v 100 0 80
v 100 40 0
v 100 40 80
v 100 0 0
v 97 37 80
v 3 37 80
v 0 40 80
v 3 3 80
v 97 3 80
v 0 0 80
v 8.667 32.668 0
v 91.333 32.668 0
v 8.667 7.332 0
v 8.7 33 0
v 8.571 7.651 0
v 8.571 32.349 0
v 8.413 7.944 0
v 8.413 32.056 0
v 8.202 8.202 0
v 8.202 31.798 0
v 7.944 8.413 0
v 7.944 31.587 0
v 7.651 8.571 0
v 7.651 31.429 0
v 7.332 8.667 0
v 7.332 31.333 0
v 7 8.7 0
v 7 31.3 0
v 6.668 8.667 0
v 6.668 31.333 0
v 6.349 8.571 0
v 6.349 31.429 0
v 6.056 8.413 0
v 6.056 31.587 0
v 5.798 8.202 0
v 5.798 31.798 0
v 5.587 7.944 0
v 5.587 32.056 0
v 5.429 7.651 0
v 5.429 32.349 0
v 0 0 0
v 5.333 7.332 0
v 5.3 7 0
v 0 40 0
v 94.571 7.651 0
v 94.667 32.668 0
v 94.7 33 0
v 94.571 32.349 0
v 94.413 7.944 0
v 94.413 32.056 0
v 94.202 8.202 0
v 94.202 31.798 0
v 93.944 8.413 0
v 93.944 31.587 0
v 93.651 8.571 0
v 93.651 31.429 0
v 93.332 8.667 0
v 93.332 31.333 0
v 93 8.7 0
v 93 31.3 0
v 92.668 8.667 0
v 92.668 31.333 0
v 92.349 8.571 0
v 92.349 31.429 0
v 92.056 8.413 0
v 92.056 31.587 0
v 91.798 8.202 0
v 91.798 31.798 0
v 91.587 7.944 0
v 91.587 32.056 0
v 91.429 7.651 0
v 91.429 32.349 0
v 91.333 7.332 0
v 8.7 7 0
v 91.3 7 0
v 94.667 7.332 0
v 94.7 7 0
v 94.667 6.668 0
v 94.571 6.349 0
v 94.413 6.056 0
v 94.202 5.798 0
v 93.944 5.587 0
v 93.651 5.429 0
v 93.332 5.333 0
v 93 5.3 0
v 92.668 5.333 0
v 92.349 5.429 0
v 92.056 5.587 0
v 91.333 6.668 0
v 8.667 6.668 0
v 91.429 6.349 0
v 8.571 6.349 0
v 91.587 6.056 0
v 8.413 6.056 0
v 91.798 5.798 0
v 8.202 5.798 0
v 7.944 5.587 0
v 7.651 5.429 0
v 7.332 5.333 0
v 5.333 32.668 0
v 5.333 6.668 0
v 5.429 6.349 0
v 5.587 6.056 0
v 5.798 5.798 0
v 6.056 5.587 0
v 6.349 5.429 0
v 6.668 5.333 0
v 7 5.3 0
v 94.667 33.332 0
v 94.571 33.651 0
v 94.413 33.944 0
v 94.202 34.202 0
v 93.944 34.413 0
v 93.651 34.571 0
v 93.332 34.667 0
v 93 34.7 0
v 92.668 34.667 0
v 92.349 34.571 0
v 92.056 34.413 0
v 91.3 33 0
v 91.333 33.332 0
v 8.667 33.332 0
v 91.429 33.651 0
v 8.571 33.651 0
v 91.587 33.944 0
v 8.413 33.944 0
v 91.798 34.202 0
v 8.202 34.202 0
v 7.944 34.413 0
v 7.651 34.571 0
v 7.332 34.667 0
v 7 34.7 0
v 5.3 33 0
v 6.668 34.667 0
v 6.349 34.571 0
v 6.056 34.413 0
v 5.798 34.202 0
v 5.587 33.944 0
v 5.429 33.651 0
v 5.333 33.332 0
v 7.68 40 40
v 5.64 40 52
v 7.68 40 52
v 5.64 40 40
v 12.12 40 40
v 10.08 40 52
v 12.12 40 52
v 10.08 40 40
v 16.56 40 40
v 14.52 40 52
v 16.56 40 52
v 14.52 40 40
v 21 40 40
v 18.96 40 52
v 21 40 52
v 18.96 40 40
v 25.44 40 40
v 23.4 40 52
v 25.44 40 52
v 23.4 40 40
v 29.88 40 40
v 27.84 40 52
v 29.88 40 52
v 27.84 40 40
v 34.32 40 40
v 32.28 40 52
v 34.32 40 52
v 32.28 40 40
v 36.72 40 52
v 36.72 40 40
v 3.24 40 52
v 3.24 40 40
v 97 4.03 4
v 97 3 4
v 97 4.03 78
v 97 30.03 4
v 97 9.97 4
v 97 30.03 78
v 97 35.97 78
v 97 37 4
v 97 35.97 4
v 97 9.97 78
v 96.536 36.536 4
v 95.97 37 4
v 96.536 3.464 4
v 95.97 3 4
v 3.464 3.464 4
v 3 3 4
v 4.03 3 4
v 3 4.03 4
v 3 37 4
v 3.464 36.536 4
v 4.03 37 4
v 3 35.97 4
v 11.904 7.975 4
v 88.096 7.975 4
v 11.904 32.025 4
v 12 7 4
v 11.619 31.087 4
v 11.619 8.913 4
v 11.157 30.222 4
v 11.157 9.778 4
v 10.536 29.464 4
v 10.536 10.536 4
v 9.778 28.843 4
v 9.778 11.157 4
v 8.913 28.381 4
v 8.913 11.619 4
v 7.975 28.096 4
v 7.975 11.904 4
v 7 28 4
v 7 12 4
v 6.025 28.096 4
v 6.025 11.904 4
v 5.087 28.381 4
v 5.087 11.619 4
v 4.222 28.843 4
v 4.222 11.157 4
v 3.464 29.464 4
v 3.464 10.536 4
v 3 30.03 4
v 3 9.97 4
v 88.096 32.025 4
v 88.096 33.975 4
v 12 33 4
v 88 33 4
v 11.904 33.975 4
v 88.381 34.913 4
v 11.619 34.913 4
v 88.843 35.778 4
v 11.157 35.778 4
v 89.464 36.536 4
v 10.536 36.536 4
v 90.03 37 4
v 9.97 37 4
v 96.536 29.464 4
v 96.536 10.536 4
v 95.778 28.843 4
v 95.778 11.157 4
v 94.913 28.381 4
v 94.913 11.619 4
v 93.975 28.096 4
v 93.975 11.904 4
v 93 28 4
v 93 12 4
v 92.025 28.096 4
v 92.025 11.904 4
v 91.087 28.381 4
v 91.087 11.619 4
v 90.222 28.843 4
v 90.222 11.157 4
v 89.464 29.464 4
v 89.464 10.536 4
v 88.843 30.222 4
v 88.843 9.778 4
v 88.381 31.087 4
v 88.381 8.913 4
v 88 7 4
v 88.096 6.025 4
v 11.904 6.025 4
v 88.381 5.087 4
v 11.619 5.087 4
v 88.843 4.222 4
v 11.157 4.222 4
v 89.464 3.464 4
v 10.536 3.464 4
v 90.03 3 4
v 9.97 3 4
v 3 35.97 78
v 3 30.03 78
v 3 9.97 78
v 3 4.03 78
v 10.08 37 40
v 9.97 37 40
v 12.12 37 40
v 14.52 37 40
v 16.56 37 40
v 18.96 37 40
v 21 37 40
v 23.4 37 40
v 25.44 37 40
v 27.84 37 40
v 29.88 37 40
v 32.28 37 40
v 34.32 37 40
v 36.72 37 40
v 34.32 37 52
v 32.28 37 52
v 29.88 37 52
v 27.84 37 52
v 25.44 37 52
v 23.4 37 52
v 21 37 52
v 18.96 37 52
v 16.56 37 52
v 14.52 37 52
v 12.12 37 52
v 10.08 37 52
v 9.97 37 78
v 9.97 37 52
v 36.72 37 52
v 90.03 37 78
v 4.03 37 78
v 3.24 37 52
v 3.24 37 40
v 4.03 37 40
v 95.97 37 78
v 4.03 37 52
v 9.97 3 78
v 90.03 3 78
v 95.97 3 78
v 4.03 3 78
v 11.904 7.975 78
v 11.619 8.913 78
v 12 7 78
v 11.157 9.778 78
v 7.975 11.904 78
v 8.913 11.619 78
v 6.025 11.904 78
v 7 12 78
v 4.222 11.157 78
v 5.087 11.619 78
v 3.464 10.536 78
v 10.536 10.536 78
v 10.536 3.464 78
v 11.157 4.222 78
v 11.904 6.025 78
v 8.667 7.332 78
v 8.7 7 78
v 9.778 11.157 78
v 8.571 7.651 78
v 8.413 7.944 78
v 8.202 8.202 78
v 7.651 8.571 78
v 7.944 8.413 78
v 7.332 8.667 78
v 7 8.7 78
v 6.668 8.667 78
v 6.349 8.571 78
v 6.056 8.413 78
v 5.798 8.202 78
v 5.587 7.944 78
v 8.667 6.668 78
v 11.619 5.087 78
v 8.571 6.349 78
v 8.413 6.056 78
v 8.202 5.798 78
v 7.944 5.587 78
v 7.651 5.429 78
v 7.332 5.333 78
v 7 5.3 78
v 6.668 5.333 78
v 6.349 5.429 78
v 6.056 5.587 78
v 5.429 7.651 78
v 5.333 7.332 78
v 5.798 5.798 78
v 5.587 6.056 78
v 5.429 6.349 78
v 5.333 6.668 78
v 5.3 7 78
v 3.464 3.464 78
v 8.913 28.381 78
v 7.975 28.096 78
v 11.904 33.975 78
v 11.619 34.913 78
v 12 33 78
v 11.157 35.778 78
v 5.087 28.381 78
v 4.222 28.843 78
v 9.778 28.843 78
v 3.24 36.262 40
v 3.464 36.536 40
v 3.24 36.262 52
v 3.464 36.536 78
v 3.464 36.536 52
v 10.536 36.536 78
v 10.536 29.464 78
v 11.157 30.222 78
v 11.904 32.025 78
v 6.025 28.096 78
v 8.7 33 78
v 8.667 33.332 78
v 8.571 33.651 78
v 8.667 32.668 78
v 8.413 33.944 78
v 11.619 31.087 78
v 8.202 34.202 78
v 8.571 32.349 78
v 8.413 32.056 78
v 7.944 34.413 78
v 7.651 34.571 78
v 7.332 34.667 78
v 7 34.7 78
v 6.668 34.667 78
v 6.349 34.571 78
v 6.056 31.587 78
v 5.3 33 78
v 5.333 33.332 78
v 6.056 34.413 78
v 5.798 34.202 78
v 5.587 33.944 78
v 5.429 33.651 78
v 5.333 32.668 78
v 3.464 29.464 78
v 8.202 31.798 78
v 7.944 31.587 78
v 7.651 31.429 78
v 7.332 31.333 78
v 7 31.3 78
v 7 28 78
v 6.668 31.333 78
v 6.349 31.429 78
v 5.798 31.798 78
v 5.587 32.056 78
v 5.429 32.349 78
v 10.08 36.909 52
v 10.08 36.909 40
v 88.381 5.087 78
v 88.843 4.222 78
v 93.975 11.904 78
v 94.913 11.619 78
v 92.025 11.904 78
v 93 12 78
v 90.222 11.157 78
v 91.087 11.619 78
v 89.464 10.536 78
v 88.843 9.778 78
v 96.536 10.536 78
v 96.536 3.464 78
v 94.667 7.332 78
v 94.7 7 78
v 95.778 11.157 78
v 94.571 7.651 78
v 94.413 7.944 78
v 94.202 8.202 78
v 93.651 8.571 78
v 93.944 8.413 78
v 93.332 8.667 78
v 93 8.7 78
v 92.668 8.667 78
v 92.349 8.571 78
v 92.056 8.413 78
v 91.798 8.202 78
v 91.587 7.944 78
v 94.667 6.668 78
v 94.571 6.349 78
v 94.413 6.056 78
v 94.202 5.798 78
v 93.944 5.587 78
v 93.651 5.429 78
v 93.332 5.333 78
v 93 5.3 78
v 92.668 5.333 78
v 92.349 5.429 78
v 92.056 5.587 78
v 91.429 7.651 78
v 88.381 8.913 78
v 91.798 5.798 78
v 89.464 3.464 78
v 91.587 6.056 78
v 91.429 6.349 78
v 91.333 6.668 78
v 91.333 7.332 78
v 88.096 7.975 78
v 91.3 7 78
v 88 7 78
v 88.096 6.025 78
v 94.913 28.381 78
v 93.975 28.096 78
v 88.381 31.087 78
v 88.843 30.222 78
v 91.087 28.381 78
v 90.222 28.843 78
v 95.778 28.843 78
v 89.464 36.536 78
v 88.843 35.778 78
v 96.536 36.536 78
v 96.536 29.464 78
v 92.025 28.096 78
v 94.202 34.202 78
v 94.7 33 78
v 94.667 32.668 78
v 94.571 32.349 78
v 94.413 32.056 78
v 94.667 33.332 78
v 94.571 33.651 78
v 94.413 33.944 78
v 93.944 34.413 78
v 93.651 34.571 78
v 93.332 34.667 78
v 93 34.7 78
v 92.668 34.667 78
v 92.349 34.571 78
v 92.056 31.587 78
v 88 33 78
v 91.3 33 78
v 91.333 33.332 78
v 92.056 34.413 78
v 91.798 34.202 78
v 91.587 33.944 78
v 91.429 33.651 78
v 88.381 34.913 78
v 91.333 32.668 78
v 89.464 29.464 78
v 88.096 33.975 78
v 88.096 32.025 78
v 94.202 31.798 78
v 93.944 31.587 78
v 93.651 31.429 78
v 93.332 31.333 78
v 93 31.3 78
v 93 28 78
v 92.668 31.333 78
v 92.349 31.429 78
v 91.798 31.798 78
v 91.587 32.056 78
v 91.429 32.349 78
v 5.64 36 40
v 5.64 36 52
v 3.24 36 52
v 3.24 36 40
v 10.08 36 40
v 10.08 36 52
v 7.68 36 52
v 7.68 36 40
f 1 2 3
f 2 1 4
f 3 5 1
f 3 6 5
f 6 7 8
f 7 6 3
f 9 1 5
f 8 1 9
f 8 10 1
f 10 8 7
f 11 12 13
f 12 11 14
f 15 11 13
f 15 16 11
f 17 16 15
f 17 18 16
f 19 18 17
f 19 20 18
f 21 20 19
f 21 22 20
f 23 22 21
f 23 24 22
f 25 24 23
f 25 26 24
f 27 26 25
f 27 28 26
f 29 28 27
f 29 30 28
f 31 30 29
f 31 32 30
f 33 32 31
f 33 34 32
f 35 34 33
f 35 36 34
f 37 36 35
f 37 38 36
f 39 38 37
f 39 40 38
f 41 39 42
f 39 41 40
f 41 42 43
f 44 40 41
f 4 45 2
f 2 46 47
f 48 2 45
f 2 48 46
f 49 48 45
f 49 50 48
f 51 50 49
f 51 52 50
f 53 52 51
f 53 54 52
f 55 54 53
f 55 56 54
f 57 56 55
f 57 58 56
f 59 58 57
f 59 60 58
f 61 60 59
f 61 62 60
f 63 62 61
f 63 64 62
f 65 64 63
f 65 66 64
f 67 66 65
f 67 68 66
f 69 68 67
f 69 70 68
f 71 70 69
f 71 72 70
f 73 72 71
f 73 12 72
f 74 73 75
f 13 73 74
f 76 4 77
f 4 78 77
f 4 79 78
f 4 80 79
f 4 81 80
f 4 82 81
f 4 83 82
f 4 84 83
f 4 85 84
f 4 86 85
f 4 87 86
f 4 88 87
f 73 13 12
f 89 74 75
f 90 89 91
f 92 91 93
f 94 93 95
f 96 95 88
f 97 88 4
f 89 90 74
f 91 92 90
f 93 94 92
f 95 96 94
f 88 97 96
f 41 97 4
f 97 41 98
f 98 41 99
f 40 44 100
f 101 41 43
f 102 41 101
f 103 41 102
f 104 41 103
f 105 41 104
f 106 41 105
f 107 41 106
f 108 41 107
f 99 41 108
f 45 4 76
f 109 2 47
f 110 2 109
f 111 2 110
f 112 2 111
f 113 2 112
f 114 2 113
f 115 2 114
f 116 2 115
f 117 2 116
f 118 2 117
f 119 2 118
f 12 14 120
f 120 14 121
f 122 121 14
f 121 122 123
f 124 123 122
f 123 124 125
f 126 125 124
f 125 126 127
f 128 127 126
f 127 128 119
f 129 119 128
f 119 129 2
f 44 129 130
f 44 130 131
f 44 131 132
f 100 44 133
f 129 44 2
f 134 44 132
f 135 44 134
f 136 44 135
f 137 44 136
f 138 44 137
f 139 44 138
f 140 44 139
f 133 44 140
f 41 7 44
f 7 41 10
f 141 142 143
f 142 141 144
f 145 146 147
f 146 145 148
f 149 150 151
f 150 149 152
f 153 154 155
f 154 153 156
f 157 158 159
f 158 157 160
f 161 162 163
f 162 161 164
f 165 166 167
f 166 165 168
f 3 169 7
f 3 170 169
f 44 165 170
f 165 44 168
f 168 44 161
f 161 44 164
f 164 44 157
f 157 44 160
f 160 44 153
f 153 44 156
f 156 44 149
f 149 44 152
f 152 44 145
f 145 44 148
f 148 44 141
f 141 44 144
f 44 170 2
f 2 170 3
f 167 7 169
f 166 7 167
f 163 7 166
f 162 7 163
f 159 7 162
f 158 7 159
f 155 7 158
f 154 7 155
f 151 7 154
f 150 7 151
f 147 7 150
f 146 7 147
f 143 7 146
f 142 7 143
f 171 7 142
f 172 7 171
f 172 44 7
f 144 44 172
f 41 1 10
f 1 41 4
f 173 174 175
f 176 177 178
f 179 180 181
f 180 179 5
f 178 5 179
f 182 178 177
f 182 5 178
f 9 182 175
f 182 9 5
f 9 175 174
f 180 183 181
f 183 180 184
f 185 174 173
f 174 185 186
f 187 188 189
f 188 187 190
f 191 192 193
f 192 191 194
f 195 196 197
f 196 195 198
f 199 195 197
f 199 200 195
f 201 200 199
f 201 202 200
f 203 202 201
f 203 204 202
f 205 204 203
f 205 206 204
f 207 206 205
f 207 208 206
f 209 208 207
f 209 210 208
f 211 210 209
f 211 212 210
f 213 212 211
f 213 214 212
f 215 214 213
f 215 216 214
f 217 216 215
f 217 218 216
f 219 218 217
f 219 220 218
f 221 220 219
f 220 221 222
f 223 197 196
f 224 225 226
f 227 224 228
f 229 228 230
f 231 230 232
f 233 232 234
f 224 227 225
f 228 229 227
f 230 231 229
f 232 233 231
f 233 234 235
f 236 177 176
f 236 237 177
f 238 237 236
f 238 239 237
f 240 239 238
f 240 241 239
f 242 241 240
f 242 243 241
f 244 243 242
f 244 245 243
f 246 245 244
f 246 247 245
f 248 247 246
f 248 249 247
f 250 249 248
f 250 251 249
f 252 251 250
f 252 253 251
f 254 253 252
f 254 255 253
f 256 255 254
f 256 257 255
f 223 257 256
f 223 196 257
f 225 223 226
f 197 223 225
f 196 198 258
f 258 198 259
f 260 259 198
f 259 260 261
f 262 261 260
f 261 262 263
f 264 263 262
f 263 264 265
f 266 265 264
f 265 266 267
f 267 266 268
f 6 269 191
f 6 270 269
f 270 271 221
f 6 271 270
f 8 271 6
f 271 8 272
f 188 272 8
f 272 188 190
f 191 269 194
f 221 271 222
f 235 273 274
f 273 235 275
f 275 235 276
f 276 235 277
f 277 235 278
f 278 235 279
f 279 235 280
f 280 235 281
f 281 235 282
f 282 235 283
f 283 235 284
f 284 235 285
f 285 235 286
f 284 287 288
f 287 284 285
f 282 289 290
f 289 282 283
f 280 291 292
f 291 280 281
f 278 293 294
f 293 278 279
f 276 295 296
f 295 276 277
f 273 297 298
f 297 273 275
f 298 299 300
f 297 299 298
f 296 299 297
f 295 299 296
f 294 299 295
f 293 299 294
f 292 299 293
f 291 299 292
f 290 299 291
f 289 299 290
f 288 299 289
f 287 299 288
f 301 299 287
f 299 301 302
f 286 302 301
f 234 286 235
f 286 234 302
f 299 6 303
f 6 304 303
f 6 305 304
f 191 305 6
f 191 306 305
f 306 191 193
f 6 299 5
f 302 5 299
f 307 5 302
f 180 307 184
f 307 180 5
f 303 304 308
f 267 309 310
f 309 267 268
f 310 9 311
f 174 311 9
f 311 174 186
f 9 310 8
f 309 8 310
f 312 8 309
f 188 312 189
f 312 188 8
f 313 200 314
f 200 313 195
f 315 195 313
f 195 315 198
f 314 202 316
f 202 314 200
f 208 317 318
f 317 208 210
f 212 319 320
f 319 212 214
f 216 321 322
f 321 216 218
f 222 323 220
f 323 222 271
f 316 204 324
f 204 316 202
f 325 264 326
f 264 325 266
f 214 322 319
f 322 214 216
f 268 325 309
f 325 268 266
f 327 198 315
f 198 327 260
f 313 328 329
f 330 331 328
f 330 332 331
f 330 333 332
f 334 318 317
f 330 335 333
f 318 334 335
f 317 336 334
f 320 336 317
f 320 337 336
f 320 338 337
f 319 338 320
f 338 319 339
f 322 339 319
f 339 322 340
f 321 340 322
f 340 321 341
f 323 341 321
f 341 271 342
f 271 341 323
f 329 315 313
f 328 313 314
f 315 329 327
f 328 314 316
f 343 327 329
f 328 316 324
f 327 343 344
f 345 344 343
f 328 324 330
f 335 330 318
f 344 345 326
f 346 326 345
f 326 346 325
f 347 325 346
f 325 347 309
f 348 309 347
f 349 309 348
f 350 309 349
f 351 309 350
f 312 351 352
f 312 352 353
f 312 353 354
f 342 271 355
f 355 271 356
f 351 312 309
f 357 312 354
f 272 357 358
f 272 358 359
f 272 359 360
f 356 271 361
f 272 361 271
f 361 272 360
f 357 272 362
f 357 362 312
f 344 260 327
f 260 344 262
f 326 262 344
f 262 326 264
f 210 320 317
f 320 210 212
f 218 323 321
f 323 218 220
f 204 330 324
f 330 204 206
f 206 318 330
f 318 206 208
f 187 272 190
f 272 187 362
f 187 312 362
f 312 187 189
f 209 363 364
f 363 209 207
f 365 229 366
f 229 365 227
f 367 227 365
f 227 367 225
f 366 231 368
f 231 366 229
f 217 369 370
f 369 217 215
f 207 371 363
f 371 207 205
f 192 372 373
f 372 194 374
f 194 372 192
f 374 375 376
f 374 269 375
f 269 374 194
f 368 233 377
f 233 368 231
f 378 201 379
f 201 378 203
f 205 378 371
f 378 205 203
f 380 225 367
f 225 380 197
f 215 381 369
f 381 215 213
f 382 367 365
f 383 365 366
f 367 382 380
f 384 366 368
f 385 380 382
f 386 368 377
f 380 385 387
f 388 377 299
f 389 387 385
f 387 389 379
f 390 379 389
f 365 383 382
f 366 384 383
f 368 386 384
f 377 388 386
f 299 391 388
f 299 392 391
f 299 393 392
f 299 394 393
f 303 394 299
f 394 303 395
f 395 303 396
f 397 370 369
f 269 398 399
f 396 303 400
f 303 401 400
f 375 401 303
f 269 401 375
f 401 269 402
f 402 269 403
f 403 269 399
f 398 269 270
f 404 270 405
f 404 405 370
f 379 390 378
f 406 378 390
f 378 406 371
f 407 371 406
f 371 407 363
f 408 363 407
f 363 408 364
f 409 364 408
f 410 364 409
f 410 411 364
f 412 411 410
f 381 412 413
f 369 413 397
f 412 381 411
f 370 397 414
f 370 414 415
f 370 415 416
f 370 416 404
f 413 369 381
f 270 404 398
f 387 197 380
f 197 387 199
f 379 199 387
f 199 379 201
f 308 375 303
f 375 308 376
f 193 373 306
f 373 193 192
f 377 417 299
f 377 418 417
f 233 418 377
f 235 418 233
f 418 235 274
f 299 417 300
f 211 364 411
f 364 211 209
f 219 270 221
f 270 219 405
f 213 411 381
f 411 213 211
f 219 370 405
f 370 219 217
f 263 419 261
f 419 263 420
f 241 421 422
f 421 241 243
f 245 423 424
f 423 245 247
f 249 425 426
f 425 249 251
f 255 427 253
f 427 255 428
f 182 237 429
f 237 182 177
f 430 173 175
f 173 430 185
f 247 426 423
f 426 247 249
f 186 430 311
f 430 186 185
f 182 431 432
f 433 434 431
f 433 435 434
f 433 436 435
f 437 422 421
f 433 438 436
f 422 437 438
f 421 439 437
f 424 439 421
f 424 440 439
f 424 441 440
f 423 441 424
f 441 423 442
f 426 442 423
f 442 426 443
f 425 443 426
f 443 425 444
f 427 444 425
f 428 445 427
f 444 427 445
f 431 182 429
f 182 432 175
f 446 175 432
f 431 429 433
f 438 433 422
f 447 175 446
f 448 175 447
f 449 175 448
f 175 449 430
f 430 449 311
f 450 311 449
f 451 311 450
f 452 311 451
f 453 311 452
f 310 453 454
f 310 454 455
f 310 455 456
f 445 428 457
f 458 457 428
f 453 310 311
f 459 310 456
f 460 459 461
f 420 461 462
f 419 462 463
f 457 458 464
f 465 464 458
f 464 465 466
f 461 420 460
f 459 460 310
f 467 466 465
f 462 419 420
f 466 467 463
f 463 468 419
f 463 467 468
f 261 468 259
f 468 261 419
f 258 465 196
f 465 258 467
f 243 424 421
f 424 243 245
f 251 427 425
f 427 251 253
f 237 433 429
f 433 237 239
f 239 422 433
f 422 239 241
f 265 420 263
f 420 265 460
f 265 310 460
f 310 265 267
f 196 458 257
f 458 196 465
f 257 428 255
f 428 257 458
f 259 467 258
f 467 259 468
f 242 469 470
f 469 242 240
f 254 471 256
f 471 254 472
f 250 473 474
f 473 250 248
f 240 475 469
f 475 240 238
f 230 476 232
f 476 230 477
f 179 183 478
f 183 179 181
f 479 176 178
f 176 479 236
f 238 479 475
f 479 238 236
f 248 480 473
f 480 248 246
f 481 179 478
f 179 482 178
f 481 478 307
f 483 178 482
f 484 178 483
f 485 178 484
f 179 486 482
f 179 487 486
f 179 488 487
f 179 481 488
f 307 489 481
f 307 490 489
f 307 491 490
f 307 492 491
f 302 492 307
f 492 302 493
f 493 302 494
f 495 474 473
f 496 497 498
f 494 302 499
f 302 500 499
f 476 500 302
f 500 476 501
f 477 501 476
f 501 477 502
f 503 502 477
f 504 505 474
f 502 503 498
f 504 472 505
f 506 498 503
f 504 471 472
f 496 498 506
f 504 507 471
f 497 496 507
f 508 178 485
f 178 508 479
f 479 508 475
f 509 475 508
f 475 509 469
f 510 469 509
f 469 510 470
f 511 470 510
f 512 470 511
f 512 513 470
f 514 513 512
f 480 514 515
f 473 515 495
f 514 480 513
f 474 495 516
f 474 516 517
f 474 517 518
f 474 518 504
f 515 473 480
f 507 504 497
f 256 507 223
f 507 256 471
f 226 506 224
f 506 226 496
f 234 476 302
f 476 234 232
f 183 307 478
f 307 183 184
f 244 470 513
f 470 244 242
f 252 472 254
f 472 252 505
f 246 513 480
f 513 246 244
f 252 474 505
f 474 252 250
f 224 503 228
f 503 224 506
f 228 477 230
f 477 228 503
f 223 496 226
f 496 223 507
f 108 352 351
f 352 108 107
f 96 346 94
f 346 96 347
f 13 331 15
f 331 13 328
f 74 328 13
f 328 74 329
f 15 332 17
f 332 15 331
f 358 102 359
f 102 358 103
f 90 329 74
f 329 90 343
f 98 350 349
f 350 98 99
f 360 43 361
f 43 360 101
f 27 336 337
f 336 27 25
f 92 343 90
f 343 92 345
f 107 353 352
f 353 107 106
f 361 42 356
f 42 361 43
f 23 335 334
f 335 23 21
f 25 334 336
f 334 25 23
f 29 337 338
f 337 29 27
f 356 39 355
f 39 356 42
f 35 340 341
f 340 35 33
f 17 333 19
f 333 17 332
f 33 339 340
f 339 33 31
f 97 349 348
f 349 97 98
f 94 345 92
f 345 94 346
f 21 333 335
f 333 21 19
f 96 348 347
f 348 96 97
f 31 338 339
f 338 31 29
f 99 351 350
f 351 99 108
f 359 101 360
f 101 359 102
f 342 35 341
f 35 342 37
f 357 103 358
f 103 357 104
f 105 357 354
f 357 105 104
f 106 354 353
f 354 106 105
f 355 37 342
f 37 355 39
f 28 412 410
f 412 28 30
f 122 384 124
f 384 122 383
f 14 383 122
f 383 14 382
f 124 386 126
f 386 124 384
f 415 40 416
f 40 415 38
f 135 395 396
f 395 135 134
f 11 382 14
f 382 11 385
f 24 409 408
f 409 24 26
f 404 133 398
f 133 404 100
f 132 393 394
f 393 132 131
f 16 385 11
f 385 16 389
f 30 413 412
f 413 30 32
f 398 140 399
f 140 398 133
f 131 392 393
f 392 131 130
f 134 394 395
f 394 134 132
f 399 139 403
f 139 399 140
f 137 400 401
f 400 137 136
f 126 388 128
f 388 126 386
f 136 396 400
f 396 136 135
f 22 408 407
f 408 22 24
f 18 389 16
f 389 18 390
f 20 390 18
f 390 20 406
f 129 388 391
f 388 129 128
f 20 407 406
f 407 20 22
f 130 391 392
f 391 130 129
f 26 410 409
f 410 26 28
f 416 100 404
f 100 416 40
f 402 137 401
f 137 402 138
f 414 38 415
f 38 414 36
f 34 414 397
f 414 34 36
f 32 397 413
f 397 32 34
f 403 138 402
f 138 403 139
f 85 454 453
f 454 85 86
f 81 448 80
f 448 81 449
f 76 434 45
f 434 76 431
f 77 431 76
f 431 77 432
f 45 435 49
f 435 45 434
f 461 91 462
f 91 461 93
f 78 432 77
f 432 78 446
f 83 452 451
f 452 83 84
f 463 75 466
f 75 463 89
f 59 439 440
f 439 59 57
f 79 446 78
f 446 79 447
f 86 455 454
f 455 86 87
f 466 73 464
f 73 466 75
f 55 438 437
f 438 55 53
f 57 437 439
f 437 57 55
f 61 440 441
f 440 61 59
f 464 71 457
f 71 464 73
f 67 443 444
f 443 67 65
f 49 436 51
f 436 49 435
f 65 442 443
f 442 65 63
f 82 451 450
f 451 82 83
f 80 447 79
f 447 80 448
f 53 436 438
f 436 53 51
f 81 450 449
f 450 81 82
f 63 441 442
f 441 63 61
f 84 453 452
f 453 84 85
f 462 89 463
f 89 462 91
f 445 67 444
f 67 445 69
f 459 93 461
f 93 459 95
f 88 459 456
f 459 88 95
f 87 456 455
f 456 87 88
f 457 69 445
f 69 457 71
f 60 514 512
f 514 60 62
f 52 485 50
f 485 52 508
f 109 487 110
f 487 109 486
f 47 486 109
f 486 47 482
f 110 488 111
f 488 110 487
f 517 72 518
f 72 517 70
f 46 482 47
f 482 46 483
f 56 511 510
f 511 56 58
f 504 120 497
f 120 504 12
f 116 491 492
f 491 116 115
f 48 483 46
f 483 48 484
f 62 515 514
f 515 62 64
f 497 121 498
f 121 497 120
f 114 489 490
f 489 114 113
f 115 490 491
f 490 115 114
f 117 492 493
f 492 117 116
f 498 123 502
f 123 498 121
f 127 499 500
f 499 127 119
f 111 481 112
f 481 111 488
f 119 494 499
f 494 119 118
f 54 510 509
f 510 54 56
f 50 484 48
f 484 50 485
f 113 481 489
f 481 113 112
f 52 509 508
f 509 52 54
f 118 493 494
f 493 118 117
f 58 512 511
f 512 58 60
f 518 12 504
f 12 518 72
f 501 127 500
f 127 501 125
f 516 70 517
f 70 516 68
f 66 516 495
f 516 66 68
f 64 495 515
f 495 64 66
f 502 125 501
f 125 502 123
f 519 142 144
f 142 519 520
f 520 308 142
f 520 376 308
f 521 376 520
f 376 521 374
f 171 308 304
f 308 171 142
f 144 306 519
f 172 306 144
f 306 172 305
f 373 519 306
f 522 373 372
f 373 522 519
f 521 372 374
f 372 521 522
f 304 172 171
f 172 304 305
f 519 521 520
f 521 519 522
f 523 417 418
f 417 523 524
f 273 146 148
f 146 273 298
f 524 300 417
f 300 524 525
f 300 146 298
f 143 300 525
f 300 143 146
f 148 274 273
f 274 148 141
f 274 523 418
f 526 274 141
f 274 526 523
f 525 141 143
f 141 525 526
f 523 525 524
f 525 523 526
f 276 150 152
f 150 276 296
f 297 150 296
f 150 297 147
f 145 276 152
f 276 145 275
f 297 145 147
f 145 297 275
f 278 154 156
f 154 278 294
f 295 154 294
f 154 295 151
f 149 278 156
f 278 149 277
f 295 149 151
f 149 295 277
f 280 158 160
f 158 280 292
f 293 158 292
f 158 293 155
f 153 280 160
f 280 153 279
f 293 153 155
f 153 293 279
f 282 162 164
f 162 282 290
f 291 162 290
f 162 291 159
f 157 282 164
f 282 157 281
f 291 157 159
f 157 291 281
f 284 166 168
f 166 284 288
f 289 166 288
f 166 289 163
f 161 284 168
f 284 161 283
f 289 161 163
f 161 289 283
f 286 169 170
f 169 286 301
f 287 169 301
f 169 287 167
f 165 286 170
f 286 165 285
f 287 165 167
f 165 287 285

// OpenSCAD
$fn = 32;

// ----------------------------------------------------------------------
// Enclosure body: 100 x 40 x 80 mm, wall 3 mm
// ----------------------------------------------------------------------

// --- parameters (mm) ---
length = 100;             // outside length, X
width = 40;               // outside width, Y
height = 80;              // outside height, Z
wall = 3;                 // side wall thickness
floor_t = 4;              // floor thickness
boss_d = 10;              // corner boss diameter
boss_h = 74;              // corner boss height above the floor
boss_hole_d = 3.4;        // lid screw clearance in the boss
boss_lip = 7;             // boss centre inset from the corner
vent_slots = 8;           // vent slots in the long wall
vent_w = 2.4;             // vent slot width
vent_h = 12;              // vent slot height
vent_pitch = 4.44;        // vent slot pitch
vent_z = 40;              // vent slot sill height

module shell() {
  difference() {
    cube([length, width, height]);
    /* hollow, open at the top */
    translate([wall, wall, floor_t])
      cube([length - 2 * wall, width - 2 * wall, height]);
  }
}

module bosses() {
  /* corner bosses, sunk 1 mm into the floor */
  for (sx = [0, 1]) for (sy = [0, 1])
    translate([sx * (length - 2 * boss_lip) + boss_lip, sy * (width - 2 * boss_lip) + boss_lip, floor_t - 1])
      cylinder(h = boss_h + 1, d = boss_d);
}

difference() {
  union() {
    shell();
    bosses();
  }
  /* boss screw holes */
  for (sx = [0, 1]) for (sy = [0, 1])
    translate([sx * (length - 2 * boss_lip) + boss_lip, sy * (width - 2 * boss_lip) + boss_lip, -1]) cylinder(h = floor_t + boss_h + 2, d = boss_hole_d);
  /* vent grille in the +Y wall */
  for (i = [0 : vent_slots - 1]) translate([vent_pitch * (i + 1) - vent_w / 2, width - wall - 1, vent_z]) cube([vent_w, wall + 2, vent_h]);
}
